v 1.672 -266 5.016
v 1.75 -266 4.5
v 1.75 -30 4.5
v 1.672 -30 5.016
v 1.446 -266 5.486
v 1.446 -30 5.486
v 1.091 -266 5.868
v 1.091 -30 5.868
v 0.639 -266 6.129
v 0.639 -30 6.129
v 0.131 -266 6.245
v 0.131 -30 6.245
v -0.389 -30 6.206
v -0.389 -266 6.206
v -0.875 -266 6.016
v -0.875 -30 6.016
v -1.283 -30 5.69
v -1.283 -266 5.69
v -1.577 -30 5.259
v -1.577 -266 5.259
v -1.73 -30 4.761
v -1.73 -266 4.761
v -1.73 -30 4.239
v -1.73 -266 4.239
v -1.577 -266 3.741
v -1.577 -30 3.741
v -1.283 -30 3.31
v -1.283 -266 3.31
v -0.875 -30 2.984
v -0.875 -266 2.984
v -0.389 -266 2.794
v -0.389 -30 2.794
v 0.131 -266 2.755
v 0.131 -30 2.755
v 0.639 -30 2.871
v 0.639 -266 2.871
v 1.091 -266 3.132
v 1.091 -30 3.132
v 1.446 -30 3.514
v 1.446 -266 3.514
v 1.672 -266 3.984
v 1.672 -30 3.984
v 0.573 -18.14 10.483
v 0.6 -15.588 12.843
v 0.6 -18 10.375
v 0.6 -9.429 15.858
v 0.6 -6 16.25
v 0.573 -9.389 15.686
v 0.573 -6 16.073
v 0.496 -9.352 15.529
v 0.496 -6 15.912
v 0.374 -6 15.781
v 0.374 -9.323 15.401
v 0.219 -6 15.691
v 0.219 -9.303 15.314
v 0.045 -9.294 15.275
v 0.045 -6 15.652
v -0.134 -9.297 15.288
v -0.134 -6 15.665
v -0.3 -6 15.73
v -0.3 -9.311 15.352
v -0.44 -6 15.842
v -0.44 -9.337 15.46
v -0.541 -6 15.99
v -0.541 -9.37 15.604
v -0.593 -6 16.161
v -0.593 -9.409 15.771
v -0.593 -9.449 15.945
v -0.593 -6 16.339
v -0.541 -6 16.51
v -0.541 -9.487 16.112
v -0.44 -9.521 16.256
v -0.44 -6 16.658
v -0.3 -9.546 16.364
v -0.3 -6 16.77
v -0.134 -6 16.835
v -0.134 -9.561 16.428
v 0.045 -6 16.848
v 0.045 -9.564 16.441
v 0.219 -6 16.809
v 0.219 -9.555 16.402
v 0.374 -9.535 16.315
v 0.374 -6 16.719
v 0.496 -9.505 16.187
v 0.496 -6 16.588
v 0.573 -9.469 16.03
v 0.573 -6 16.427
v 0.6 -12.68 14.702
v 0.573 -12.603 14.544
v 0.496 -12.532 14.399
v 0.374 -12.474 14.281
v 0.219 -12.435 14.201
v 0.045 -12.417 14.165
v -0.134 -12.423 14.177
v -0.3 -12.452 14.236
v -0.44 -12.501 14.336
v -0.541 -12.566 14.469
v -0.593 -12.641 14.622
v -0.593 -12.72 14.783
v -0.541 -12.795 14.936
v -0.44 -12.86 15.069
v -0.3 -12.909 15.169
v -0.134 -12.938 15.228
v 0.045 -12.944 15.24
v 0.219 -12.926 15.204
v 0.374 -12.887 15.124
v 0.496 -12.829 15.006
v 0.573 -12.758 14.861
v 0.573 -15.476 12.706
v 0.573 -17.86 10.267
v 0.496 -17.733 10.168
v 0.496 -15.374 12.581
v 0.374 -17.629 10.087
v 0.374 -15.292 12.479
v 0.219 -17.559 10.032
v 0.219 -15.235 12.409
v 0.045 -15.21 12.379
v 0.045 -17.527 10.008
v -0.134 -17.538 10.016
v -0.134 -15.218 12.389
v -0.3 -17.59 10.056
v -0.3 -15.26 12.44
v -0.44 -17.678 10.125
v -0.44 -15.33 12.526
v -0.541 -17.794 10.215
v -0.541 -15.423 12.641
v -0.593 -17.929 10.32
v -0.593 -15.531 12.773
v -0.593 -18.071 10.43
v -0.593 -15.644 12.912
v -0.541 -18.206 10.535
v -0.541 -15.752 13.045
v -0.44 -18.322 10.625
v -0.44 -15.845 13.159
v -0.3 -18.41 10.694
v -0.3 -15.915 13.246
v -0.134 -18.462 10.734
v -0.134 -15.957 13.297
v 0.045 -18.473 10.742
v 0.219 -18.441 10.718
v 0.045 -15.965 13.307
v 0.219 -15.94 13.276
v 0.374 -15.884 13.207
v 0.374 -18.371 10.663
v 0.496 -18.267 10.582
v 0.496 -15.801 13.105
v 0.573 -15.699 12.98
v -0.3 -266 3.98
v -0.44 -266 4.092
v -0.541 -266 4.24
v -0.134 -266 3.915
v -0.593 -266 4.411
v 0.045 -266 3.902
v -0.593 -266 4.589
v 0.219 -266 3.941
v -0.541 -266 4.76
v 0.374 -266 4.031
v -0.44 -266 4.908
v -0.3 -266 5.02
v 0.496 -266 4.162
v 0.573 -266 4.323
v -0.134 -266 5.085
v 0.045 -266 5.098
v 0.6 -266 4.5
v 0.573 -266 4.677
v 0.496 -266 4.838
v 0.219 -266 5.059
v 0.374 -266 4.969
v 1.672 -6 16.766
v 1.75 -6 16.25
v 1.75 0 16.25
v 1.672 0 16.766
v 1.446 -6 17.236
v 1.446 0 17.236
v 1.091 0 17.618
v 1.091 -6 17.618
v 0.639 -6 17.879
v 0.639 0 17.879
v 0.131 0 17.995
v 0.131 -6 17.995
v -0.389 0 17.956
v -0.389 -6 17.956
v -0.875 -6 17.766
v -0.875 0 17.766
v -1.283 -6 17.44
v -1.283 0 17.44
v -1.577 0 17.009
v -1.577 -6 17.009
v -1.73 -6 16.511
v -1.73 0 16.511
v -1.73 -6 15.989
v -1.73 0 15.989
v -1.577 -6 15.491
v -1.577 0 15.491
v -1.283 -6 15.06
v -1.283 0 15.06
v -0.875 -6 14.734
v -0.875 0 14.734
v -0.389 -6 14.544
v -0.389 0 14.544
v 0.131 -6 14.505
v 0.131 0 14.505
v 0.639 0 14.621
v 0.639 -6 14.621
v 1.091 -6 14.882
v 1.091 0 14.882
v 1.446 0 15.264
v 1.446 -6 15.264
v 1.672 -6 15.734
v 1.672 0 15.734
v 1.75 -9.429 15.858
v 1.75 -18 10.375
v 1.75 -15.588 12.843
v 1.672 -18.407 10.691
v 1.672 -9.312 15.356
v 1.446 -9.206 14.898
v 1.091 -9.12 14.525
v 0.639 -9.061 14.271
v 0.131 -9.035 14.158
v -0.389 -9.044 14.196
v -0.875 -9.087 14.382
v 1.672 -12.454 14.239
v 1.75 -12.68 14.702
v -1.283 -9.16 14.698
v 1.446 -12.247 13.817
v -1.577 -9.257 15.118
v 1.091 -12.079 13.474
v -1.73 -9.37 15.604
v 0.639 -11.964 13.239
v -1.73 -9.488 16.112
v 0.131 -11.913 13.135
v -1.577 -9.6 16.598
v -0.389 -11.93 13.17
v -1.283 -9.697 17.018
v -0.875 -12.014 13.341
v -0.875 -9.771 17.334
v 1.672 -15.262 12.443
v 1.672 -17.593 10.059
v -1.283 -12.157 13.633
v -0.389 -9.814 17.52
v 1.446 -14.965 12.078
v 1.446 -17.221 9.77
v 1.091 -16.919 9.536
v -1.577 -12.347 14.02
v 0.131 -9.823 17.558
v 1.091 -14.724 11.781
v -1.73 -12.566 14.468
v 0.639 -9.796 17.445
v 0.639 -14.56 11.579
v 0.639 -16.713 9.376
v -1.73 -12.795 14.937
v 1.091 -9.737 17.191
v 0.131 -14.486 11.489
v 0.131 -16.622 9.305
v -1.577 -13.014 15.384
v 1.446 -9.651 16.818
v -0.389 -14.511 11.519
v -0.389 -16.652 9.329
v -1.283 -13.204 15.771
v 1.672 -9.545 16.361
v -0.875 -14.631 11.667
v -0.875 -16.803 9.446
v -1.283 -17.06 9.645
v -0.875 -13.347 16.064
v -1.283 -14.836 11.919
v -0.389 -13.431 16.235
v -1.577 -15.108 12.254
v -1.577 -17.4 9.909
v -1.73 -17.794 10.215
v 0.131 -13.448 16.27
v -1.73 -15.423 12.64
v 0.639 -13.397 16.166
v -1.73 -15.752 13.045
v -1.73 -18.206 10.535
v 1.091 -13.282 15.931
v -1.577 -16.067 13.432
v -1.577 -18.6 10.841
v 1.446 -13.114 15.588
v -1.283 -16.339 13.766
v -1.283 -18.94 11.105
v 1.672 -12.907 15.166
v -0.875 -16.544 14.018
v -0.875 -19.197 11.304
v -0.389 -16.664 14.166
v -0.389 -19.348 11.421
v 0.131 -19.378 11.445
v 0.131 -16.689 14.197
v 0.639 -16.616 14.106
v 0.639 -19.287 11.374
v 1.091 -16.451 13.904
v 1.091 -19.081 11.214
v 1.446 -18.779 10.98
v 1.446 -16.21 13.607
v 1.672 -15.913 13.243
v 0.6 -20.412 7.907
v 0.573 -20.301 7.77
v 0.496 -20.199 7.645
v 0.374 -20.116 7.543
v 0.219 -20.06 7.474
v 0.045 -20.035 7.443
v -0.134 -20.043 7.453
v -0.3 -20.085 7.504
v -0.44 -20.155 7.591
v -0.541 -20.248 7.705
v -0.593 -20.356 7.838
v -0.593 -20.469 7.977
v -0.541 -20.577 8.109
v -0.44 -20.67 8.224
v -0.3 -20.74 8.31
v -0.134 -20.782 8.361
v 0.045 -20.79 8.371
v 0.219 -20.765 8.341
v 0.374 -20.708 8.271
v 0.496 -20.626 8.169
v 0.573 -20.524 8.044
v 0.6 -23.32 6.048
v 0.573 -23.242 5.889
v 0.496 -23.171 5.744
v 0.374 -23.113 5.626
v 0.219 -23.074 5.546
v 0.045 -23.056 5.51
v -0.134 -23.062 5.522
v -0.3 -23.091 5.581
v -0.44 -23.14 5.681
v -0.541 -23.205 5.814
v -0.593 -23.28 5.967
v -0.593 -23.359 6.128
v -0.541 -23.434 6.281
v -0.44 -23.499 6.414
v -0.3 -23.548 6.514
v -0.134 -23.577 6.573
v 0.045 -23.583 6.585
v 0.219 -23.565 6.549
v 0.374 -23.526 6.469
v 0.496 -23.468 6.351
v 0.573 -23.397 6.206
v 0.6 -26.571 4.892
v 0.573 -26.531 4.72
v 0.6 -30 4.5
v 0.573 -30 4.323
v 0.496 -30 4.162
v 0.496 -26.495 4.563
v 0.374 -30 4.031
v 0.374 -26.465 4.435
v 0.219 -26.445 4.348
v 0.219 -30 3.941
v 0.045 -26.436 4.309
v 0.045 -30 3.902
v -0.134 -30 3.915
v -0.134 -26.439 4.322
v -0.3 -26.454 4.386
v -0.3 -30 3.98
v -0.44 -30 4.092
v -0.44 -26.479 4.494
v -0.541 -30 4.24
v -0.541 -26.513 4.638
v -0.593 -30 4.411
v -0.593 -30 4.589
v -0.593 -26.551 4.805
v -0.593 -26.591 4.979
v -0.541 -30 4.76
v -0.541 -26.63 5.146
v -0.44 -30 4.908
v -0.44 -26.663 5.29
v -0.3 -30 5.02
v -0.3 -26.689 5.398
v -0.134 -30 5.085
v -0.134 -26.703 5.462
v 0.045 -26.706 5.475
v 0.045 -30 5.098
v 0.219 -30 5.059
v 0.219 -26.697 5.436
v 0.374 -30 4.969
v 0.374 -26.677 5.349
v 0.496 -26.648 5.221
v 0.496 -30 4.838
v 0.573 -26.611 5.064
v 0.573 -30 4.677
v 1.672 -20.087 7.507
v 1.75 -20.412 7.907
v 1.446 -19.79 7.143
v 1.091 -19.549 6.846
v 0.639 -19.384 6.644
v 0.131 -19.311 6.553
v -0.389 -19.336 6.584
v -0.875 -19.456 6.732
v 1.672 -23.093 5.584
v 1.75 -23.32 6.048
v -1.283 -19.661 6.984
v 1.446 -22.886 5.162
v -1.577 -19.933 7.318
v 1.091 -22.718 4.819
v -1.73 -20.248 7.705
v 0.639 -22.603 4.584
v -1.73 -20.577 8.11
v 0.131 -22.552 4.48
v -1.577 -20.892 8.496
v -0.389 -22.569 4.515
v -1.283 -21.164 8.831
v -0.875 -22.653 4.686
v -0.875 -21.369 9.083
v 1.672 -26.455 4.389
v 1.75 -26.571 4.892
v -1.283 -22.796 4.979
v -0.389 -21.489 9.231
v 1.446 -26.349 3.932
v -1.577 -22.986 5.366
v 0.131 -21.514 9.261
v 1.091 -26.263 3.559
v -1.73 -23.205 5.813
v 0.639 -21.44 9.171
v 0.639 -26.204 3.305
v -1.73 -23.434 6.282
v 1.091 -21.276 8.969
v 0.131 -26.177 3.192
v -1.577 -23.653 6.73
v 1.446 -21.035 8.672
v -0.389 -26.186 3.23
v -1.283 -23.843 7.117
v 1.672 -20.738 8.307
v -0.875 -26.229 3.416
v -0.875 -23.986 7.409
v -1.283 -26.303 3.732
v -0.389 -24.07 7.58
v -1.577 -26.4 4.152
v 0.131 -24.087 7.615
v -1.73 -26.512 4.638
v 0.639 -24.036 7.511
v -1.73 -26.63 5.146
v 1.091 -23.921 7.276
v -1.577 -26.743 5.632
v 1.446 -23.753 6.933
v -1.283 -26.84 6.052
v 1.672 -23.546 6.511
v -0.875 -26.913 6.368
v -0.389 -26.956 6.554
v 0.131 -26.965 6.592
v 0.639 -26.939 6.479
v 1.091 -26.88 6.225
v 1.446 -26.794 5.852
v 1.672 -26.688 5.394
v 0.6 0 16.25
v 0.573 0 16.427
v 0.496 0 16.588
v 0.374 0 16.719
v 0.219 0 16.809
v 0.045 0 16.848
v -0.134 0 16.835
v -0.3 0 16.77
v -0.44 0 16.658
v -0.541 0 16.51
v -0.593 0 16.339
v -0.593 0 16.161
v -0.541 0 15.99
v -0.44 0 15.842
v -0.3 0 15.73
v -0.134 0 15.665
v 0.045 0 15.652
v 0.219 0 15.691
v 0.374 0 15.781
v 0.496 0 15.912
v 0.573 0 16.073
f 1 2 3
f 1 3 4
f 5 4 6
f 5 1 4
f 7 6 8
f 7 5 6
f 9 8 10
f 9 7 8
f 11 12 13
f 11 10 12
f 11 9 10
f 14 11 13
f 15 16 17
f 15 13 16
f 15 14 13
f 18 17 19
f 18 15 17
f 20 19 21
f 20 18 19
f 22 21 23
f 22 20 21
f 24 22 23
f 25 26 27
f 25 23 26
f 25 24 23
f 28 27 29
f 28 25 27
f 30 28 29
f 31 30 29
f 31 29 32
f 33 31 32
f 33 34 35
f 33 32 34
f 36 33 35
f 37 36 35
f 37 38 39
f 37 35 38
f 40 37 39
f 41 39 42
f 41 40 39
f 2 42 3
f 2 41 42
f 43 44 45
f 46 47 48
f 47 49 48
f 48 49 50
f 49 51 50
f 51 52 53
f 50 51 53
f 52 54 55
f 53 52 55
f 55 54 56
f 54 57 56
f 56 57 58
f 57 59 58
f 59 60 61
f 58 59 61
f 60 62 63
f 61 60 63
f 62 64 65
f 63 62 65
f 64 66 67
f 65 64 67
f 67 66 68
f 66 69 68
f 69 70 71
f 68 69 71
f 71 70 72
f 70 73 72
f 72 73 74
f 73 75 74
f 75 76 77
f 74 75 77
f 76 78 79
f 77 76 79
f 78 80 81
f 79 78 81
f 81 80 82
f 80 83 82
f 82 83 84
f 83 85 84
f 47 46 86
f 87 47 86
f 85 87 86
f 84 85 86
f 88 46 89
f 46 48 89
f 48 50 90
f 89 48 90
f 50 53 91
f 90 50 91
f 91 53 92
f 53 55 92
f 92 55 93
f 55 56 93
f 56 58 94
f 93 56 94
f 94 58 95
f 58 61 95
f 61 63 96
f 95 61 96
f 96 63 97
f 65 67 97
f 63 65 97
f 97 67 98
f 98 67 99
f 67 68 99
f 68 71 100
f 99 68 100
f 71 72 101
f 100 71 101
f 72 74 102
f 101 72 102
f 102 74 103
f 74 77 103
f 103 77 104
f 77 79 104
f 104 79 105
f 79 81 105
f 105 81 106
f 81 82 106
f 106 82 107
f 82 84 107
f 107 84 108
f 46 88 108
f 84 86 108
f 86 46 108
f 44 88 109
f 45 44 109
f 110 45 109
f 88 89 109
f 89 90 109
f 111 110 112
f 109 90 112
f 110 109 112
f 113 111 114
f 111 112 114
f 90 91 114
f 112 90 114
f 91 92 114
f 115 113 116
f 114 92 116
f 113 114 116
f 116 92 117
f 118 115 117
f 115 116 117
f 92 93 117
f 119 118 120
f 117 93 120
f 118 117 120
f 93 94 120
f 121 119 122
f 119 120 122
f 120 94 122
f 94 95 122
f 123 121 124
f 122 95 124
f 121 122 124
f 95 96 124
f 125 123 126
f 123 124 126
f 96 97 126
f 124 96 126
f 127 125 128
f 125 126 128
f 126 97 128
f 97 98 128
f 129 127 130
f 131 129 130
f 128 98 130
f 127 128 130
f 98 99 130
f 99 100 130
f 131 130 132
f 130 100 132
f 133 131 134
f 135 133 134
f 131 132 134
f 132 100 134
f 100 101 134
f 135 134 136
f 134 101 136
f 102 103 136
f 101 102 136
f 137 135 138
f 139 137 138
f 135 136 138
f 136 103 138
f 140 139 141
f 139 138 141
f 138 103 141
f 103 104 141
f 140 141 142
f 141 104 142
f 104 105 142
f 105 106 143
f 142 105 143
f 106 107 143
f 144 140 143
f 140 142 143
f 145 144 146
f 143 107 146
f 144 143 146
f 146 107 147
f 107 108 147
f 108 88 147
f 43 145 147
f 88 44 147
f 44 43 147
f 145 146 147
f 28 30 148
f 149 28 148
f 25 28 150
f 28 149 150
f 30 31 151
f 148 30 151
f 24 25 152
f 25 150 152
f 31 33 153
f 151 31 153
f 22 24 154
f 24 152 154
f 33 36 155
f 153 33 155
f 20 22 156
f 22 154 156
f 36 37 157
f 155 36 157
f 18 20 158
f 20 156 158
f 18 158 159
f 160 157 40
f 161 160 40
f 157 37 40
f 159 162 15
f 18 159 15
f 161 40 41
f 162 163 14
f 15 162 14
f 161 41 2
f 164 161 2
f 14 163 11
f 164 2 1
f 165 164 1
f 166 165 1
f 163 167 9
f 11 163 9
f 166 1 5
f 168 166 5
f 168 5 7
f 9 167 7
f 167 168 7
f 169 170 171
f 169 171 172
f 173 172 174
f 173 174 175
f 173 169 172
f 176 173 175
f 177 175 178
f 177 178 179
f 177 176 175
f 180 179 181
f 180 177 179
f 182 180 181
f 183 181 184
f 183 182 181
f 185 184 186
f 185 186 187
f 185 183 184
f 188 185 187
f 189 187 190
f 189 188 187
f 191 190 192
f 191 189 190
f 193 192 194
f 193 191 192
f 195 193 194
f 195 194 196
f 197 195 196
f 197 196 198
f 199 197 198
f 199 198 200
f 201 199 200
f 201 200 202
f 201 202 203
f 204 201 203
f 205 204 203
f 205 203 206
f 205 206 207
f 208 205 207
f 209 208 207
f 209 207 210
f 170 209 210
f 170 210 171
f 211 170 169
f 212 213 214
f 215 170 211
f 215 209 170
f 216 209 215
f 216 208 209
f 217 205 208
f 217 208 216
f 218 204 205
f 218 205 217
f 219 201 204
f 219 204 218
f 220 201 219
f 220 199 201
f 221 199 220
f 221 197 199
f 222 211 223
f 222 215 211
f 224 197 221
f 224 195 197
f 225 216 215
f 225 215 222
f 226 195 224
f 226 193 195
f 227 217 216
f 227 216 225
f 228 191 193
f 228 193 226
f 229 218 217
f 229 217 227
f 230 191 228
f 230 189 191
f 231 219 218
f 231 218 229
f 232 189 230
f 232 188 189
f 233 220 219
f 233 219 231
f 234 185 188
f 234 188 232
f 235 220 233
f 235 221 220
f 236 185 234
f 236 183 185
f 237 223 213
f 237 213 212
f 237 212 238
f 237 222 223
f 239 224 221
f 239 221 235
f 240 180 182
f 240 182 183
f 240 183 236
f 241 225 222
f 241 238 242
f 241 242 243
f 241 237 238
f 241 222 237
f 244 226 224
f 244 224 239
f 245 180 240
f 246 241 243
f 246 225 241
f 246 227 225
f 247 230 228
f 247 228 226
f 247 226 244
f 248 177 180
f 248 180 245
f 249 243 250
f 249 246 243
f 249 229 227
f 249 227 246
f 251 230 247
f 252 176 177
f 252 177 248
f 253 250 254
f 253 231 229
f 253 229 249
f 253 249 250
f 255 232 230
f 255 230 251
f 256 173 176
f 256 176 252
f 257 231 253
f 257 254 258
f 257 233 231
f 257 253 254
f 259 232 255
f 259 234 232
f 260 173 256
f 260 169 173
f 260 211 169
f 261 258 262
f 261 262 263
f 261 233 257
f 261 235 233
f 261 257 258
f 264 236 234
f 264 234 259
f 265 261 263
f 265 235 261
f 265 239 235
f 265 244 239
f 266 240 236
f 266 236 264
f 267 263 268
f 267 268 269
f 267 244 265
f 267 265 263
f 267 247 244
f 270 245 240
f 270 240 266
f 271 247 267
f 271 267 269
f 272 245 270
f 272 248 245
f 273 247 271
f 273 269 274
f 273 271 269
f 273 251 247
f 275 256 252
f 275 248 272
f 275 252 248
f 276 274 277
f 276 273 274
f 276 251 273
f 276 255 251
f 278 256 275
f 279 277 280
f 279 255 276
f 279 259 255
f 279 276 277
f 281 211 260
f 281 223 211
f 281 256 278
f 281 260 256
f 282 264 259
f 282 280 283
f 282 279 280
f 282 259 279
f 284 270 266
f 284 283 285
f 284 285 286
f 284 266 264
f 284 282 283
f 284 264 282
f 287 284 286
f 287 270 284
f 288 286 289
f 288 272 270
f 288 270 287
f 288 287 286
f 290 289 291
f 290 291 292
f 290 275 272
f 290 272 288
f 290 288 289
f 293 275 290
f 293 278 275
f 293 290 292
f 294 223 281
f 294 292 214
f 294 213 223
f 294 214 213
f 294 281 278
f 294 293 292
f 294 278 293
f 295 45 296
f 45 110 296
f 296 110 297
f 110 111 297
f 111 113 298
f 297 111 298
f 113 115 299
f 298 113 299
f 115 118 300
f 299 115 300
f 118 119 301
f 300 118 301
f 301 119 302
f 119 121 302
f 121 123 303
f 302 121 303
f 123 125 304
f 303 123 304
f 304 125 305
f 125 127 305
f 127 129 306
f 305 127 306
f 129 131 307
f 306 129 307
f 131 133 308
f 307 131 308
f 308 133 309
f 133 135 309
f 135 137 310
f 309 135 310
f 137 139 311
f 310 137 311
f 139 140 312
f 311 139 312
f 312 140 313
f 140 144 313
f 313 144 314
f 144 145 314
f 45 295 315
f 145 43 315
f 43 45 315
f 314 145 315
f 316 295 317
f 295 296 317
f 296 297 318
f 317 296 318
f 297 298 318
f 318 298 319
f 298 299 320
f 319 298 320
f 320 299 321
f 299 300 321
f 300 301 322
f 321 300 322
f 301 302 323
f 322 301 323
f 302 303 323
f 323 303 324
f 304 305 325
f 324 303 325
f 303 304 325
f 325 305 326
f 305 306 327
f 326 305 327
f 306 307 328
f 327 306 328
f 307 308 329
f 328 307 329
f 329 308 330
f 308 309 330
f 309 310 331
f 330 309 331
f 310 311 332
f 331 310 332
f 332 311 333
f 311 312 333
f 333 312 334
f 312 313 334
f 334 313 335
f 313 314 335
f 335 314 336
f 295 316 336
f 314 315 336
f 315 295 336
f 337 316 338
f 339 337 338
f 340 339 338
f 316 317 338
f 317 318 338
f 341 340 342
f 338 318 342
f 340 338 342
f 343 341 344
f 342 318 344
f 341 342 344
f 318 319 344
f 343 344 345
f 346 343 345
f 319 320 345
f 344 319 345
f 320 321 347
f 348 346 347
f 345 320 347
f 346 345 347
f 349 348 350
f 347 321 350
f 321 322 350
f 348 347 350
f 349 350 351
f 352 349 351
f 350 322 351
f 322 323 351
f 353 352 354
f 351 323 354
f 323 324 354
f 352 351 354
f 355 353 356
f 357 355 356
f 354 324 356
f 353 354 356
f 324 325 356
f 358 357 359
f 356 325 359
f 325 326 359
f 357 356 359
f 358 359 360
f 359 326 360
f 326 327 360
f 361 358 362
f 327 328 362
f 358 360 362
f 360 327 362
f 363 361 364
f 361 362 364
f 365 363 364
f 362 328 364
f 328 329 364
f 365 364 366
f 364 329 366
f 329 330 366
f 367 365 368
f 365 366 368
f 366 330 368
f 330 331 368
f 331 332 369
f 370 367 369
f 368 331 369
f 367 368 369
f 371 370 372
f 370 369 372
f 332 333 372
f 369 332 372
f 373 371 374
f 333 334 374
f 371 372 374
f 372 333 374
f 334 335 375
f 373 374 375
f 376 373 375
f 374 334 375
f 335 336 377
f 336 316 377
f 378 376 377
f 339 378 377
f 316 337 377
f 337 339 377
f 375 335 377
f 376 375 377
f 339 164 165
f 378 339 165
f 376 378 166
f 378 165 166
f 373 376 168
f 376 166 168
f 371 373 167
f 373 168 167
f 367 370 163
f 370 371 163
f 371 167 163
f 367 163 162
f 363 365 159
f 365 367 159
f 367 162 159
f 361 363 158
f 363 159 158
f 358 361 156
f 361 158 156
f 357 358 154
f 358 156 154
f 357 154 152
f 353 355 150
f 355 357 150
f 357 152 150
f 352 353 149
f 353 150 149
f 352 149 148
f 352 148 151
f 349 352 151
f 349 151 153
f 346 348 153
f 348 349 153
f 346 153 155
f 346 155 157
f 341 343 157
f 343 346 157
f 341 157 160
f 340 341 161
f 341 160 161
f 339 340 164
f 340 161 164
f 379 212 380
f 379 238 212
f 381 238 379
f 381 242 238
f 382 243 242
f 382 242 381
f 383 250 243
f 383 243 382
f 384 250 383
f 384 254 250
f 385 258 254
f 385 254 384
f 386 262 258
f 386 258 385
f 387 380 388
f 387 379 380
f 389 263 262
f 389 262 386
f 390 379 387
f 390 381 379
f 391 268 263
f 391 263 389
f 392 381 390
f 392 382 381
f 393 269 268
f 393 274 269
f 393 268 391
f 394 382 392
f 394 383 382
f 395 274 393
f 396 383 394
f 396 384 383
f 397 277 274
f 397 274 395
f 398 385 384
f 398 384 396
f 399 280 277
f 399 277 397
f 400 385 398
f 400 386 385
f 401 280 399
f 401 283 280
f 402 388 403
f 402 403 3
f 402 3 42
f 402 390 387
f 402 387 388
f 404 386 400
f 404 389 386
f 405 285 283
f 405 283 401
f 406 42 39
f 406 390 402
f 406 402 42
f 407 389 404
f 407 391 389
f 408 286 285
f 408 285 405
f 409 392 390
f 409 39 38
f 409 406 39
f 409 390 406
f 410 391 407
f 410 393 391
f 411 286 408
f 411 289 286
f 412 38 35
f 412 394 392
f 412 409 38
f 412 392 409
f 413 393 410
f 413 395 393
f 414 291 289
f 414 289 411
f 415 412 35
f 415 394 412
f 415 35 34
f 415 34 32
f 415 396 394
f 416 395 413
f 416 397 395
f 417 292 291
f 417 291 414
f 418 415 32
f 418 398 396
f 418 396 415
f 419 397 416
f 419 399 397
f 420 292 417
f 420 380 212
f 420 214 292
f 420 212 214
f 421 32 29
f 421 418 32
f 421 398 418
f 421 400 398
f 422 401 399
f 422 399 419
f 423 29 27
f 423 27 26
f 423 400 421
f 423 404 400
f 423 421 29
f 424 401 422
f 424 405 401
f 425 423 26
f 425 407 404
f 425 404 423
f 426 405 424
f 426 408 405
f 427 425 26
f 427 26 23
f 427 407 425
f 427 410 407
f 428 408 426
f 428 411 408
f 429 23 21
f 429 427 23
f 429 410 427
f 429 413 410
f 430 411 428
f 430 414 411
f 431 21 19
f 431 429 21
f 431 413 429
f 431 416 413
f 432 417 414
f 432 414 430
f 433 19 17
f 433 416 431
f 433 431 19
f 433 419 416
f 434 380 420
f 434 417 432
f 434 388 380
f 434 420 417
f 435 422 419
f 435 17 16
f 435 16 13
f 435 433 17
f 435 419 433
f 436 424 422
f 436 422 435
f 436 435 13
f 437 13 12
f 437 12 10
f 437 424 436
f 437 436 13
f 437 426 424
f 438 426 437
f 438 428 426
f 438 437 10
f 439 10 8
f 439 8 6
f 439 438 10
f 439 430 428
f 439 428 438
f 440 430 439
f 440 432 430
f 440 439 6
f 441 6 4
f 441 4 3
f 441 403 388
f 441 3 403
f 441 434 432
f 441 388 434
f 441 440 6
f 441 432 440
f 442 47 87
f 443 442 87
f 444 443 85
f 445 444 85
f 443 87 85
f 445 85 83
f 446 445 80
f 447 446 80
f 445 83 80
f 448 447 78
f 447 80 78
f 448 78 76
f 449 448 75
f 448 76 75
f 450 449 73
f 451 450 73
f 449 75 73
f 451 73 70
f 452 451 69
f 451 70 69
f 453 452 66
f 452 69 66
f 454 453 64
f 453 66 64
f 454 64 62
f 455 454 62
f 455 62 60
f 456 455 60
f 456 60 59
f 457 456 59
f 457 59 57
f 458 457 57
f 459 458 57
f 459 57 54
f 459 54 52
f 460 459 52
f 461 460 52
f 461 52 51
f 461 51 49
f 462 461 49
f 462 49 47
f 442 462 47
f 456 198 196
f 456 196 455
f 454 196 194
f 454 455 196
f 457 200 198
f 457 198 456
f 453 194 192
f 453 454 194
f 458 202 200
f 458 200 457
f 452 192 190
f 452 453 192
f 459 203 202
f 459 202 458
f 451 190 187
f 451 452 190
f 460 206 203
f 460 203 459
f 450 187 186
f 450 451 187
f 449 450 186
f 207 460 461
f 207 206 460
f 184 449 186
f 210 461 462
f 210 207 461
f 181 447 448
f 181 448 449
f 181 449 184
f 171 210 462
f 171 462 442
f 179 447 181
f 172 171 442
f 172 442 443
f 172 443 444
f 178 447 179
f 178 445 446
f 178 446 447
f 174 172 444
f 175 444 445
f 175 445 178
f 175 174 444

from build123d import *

# Parameters (mm, degrees)
UTILITY_CIRCULAR_CROSS_SECTION_R   = 1.75
UTILITY_CIRCULAR_CROSS_SECTION_R_2 = 0.6


with BuildPart() as part:
    # Native hollow utility sweep: sweep along a path in Illustrative smooth utility route
    with BuildLine(Plane(origin=(0, 0, 0), x_dir=(0, 0, -1), z_dir=(1, 0, 0))) as native_hollow_utility_sweep_path:
        Line((-16.25, 0), (-16.25, -6))
        ThreePointArc((-16.25, -6), (-14.702430847, -12.680486977), (-10.375, -18))
        ThreePointArc((-10.375, -18), (-6.047569153, -23.319513023), (-4.5, -30))
        Line((-4.5, -30), (-4.5, -266))
    # Utility circular cross section → Native hollow utility sweep (sweep)
    with BuildSketch(Plane(origin=(0, 0, 0), x_dir=(1, 0, 0), z_dir=(0, 1, 0))):
        with Locations((0, -16.25)):
            Circle(UTILITY_CIRCULAR_CROSS_SECTION_R)
        with Locations((0, -16.25)):
            Circle(UTILITY_CIRCULAR_CROSS_SECTION_R_2, mode=Mode.SUBTRACT)
    sweep(path=native_hollow_utility_sweep_path.line)


solid = part.part
